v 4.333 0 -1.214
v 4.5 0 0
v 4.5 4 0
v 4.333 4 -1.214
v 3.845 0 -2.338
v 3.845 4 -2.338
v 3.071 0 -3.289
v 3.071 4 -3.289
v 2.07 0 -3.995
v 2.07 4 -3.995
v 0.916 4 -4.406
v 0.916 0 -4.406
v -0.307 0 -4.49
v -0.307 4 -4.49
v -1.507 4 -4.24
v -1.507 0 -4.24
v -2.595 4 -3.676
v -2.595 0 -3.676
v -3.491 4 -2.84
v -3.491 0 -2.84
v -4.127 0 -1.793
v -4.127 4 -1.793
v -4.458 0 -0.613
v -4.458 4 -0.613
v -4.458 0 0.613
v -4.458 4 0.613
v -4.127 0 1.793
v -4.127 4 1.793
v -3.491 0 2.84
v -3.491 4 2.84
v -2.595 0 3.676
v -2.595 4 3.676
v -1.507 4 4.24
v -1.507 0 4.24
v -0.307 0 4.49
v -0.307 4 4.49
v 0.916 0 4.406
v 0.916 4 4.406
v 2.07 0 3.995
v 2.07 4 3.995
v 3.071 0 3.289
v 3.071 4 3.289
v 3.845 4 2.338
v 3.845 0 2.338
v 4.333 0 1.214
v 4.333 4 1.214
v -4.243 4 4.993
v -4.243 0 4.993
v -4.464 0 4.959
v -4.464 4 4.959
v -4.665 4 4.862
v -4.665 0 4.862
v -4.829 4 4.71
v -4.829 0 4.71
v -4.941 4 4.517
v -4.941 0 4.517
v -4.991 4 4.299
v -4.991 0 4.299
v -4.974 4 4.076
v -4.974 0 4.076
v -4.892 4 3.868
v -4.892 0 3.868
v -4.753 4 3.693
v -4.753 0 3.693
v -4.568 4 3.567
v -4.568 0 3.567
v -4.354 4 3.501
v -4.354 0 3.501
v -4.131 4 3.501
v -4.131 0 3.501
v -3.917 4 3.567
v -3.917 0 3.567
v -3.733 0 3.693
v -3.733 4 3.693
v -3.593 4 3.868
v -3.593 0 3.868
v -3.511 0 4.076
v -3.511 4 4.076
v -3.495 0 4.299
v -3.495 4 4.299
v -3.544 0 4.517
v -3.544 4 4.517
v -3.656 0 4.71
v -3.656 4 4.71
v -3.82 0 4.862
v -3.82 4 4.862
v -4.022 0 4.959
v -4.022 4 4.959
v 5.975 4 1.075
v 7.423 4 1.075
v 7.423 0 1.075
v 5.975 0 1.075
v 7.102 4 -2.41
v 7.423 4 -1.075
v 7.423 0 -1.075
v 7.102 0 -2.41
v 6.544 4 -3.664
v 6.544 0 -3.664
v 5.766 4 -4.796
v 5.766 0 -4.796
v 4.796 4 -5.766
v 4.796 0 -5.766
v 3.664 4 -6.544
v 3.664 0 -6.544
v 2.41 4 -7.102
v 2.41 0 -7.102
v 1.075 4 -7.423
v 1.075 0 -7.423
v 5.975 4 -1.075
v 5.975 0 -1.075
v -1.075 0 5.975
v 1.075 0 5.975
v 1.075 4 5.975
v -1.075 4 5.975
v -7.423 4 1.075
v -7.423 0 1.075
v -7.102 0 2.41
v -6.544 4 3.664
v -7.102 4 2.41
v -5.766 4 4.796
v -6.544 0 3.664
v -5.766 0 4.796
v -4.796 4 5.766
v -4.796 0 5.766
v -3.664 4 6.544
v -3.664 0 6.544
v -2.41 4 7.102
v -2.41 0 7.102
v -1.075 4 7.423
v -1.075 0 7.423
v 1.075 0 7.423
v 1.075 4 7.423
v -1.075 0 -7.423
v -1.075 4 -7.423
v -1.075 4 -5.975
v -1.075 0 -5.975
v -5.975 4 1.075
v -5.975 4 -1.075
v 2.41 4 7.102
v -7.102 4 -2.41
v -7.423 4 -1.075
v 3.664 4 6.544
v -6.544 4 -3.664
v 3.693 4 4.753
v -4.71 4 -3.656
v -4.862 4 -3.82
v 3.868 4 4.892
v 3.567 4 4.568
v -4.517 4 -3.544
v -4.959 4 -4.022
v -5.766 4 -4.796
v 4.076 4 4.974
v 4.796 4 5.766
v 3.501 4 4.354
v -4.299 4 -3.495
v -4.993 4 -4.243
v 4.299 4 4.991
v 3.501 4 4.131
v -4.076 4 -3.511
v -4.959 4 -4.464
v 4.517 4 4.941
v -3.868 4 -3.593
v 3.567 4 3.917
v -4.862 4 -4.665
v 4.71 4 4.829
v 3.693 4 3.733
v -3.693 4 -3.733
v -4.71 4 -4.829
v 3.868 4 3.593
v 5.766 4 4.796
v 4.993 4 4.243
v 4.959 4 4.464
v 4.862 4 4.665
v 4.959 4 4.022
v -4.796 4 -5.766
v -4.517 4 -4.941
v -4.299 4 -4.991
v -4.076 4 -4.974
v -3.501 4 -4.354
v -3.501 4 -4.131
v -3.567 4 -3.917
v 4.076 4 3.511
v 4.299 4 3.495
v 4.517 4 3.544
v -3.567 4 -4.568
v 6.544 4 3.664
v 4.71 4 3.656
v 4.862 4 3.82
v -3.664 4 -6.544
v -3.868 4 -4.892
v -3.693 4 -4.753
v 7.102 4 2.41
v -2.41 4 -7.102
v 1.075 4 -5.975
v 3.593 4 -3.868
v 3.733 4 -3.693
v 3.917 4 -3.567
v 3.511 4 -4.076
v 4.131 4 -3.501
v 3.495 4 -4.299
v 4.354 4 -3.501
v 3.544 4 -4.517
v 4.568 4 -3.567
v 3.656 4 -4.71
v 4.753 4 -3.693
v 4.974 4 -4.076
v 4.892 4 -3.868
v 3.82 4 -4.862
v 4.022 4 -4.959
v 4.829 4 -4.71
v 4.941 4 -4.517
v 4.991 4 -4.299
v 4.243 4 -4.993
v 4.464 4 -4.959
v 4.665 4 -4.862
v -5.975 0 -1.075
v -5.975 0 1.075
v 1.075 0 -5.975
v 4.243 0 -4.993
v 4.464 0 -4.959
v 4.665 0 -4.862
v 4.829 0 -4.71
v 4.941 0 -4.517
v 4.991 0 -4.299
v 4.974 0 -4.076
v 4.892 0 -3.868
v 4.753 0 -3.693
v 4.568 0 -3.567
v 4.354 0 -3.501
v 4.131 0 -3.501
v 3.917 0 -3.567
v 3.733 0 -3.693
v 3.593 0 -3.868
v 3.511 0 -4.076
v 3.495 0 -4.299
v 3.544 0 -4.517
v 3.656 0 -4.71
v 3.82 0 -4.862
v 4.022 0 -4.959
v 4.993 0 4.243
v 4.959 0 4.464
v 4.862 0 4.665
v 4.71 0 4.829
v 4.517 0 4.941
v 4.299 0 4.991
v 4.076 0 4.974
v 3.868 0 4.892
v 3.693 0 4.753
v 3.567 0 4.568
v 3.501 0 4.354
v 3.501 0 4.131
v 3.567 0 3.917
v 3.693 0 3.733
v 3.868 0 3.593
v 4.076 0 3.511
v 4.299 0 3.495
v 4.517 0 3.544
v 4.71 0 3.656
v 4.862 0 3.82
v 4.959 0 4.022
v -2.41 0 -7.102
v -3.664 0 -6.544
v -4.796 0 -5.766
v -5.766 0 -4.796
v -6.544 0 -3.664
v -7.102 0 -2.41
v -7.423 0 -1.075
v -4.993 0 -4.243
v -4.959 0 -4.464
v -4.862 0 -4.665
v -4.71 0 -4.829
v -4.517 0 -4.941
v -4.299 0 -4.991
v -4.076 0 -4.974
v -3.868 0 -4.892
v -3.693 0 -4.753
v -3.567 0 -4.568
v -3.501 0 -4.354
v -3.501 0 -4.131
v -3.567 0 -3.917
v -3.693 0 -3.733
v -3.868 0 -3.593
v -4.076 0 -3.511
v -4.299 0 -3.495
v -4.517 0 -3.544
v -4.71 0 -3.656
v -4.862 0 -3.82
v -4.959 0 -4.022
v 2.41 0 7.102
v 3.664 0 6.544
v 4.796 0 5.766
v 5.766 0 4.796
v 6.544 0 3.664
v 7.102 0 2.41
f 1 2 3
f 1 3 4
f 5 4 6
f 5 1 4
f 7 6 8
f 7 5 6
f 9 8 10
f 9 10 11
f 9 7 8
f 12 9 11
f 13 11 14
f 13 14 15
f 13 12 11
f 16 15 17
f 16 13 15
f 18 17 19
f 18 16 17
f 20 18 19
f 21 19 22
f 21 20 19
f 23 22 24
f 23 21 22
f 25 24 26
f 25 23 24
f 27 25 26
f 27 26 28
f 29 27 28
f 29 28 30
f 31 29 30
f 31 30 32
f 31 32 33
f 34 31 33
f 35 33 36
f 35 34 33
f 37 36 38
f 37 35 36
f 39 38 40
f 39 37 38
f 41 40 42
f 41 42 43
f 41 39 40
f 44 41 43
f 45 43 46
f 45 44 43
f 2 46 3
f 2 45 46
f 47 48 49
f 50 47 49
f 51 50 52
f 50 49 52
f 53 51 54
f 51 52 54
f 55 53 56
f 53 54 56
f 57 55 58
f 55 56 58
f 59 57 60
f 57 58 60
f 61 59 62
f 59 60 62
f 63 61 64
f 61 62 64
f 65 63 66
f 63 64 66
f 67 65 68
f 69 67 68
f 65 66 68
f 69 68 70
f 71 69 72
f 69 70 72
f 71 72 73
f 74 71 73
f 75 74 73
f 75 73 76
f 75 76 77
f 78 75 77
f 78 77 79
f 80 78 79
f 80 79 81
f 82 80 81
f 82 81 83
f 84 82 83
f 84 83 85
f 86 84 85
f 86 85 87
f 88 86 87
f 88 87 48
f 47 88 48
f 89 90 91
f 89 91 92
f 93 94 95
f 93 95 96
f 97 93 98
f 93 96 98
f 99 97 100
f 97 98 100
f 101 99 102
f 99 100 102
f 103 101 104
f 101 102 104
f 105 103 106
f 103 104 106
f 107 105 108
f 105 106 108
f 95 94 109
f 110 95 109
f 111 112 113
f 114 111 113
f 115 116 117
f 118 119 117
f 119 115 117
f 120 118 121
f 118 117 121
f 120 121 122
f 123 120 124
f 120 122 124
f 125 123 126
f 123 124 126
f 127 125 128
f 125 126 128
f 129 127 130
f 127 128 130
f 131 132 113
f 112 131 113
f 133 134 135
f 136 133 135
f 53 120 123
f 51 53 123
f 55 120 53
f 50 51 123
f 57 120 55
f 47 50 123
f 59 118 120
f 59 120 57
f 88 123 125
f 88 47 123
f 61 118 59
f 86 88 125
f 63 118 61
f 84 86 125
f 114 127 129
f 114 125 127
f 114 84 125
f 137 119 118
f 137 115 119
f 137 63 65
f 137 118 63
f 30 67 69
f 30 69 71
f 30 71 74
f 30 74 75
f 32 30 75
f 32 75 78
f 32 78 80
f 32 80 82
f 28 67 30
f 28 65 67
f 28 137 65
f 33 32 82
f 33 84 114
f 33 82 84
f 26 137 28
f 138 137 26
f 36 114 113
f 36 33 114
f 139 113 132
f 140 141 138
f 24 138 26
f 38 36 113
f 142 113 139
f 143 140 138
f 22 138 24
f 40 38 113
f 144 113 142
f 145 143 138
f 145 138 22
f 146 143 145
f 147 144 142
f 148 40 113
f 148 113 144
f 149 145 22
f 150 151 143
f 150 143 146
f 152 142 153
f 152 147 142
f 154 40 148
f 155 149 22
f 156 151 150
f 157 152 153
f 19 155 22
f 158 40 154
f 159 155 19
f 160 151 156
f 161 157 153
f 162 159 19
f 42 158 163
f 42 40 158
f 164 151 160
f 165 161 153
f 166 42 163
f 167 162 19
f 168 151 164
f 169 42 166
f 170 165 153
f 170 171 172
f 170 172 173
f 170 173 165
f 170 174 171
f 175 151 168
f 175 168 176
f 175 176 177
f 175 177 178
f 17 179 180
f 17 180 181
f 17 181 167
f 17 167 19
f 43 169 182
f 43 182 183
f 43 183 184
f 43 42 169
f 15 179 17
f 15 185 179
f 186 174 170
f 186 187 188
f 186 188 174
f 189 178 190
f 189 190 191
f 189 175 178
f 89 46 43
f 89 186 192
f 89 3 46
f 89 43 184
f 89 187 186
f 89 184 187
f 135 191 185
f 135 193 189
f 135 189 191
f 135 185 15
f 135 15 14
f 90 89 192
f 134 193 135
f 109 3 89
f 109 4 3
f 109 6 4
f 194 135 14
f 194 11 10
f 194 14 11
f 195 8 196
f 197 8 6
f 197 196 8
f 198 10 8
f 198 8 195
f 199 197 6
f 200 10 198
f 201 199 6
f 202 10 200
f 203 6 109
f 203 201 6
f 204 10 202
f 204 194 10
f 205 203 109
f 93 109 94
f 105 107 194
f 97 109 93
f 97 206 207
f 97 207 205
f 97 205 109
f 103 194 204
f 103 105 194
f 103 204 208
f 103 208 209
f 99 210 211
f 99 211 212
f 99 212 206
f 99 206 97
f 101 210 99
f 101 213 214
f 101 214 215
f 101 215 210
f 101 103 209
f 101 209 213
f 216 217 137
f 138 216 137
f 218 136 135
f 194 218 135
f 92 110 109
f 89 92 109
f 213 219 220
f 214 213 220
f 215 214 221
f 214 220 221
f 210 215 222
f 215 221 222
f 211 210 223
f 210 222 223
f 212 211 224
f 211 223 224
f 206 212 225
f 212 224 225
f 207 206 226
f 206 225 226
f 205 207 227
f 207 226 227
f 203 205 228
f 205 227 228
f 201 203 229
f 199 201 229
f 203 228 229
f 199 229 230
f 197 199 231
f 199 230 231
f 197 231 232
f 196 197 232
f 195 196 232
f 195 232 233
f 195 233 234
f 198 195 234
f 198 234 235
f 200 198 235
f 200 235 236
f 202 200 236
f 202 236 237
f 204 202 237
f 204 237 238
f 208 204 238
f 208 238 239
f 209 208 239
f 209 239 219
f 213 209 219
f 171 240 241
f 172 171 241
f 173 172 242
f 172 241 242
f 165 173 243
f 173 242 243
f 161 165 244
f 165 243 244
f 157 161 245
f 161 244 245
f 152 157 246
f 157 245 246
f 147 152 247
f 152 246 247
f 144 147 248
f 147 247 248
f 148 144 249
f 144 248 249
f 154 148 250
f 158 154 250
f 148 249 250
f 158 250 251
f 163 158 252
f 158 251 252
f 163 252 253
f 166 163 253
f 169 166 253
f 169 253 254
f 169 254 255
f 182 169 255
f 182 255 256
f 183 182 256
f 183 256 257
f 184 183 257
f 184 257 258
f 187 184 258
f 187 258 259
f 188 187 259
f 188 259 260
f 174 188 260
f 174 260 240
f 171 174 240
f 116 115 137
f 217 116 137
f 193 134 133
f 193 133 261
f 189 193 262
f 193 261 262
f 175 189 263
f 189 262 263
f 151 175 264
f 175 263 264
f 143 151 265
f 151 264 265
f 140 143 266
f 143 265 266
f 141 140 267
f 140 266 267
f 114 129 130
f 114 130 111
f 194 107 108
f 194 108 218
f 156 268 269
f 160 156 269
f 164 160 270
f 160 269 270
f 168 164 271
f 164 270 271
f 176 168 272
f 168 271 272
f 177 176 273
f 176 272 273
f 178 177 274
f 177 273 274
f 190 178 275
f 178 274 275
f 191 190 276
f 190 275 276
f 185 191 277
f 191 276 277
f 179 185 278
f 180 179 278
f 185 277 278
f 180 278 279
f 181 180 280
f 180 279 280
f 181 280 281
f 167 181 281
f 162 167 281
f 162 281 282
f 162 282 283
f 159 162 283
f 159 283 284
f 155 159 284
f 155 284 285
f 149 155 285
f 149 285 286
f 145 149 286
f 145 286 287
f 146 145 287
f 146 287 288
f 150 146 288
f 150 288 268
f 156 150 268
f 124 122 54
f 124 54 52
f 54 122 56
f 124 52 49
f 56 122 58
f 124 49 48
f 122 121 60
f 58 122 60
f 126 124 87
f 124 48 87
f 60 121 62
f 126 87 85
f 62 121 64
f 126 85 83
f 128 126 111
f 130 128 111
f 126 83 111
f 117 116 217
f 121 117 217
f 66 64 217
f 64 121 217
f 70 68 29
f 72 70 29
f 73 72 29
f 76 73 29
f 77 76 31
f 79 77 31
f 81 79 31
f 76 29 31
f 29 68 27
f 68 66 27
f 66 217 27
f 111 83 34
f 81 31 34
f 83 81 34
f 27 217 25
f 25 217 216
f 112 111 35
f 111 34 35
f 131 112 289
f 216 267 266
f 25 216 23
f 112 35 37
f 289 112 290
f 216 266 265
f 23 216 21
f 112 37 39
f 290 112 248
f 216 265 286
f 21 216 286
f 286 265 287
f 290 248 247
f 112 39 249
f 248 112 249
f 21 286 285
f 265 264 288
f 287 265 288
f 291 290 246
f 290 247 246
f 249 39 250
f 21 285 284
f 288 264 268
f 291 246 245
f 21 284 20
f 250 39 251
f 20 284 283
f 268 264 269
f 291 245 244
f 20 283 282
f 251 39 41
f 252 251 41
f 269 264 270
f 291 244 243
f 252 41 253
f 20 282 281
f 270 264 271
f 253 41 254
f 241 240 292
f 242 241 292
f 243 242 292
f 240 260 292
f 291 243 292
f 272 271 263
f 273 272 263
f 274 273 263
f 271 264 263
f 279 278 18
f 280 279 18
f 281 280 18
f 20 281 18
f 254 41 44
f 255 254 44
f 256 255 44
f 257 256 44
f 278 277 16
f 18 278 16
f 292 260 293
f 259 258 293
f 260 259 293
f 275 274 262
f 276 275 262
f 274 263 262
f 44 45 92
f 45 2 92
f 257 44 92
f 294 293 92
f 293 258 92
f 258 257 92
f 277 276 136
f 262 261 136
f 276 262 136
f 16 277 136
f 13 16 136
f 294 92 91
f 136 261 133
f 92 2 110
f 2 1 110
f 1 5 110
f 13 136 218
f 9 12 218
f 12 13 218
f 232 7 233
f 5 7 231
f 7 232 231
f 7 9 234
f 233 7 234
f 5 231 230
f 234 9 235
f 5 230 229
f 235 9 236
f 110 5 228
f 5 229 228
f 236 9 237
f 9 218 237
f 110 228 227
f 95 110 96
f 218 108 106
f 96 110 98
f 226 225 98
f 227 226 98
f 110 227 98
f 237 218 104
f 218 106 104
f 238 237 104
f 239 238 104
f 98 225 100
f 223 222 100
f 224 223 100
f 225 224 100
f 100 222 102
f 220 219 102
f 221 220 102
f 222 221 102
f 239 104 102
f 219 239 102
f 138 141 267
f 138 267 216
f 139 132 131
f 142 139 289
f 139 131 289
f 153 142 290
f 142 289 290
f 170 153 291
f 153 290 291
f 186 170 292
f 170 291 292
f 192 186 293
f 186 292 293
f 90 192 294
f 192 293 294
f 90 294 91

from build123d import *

# Parameters (mm, degrees)
SKETCH1_R           = 7.5
SKETCH1_R_2         = 4.5
BOSS_EXTRUDE1_DEPTH = 4
SKETCH3_W           = 1.525
SKETCH3_H           = 4
CUT_EXTRUDE1_DEPTH  = 1.075
CIRPATTERN1_COUNT   = 4
SKETCH6_R           = 0.75
CUT_EXTRUDE3_DEPTH  = 5
CIRPATTERN3_COUNT   = 4


with BuildPart() as part:
    # Sketch1 → Boss-Extrude1 (new body)
    with BuildSketch(Plane(origin=(0, 0, 0), x_dir=(1, 0, 0), z_dir=(0, 1, 0))):
        Circle(SKETCH1_R)
        Circle(SKETCH1_R_2, mode=Mode.SUBTRACT)
    extrude(amount=BOSS_EXTRUDE1_DEPTH)

    # Sketch3 → Cut-Extrude1 (cut, symmetric)
    with BuildSketch(Plane(origin=(0, 0, 0), x_dir=(0, 0, -1), z_dir=(1, 0, 0))):
        with Locations((-6.7375, 2)):
            Rectangle(SKETCH3_W, SKETCH3_H)
    cut_extrude1 = extrude(amount=CUT_EXTRUDE1_DEPTH, both=True, mode=Mode.SUBTRACT)

    # CirPattern1: Cut-Extrude1 ×4 about axis
    cirpattern1_axis = Axis((0, 0, 0), (0, 1, 0))
    for i in range(1, CIRPATTERN1_COUNT):
        add(cut_extrude1.rotate(cirpattern1_axis, i * 360 / CIRPATTERN1_COUNT), mode=Mode.SUBTRACT)

    # Sketch6 → Cut-Extrude3 (cut, through all)
    with BuildSketch(Plane.XZ):
        with Locations((4.242640687, 4.242640687)):
            Circle(SKETCH6_R)
    cut_extrude3 = extrude(amount=-CUT_EXTRUDE3_DEPTH, mode=Mode.SUBTRACT)

    # CirPattern3: Cut-Extrude3 ×4 about axis
    cirpattern3_axis = Axis((0, 0, 0), (0, 1, 0))
    for i in range(1, CIRPATTERN3_COUNT):
        add(cut_extrude3.rotate(cirpattern3_axis, i * 360 / CIRPATTERN3_COUNT), mode=Mode.SUBTRACT)


solid = part.part
